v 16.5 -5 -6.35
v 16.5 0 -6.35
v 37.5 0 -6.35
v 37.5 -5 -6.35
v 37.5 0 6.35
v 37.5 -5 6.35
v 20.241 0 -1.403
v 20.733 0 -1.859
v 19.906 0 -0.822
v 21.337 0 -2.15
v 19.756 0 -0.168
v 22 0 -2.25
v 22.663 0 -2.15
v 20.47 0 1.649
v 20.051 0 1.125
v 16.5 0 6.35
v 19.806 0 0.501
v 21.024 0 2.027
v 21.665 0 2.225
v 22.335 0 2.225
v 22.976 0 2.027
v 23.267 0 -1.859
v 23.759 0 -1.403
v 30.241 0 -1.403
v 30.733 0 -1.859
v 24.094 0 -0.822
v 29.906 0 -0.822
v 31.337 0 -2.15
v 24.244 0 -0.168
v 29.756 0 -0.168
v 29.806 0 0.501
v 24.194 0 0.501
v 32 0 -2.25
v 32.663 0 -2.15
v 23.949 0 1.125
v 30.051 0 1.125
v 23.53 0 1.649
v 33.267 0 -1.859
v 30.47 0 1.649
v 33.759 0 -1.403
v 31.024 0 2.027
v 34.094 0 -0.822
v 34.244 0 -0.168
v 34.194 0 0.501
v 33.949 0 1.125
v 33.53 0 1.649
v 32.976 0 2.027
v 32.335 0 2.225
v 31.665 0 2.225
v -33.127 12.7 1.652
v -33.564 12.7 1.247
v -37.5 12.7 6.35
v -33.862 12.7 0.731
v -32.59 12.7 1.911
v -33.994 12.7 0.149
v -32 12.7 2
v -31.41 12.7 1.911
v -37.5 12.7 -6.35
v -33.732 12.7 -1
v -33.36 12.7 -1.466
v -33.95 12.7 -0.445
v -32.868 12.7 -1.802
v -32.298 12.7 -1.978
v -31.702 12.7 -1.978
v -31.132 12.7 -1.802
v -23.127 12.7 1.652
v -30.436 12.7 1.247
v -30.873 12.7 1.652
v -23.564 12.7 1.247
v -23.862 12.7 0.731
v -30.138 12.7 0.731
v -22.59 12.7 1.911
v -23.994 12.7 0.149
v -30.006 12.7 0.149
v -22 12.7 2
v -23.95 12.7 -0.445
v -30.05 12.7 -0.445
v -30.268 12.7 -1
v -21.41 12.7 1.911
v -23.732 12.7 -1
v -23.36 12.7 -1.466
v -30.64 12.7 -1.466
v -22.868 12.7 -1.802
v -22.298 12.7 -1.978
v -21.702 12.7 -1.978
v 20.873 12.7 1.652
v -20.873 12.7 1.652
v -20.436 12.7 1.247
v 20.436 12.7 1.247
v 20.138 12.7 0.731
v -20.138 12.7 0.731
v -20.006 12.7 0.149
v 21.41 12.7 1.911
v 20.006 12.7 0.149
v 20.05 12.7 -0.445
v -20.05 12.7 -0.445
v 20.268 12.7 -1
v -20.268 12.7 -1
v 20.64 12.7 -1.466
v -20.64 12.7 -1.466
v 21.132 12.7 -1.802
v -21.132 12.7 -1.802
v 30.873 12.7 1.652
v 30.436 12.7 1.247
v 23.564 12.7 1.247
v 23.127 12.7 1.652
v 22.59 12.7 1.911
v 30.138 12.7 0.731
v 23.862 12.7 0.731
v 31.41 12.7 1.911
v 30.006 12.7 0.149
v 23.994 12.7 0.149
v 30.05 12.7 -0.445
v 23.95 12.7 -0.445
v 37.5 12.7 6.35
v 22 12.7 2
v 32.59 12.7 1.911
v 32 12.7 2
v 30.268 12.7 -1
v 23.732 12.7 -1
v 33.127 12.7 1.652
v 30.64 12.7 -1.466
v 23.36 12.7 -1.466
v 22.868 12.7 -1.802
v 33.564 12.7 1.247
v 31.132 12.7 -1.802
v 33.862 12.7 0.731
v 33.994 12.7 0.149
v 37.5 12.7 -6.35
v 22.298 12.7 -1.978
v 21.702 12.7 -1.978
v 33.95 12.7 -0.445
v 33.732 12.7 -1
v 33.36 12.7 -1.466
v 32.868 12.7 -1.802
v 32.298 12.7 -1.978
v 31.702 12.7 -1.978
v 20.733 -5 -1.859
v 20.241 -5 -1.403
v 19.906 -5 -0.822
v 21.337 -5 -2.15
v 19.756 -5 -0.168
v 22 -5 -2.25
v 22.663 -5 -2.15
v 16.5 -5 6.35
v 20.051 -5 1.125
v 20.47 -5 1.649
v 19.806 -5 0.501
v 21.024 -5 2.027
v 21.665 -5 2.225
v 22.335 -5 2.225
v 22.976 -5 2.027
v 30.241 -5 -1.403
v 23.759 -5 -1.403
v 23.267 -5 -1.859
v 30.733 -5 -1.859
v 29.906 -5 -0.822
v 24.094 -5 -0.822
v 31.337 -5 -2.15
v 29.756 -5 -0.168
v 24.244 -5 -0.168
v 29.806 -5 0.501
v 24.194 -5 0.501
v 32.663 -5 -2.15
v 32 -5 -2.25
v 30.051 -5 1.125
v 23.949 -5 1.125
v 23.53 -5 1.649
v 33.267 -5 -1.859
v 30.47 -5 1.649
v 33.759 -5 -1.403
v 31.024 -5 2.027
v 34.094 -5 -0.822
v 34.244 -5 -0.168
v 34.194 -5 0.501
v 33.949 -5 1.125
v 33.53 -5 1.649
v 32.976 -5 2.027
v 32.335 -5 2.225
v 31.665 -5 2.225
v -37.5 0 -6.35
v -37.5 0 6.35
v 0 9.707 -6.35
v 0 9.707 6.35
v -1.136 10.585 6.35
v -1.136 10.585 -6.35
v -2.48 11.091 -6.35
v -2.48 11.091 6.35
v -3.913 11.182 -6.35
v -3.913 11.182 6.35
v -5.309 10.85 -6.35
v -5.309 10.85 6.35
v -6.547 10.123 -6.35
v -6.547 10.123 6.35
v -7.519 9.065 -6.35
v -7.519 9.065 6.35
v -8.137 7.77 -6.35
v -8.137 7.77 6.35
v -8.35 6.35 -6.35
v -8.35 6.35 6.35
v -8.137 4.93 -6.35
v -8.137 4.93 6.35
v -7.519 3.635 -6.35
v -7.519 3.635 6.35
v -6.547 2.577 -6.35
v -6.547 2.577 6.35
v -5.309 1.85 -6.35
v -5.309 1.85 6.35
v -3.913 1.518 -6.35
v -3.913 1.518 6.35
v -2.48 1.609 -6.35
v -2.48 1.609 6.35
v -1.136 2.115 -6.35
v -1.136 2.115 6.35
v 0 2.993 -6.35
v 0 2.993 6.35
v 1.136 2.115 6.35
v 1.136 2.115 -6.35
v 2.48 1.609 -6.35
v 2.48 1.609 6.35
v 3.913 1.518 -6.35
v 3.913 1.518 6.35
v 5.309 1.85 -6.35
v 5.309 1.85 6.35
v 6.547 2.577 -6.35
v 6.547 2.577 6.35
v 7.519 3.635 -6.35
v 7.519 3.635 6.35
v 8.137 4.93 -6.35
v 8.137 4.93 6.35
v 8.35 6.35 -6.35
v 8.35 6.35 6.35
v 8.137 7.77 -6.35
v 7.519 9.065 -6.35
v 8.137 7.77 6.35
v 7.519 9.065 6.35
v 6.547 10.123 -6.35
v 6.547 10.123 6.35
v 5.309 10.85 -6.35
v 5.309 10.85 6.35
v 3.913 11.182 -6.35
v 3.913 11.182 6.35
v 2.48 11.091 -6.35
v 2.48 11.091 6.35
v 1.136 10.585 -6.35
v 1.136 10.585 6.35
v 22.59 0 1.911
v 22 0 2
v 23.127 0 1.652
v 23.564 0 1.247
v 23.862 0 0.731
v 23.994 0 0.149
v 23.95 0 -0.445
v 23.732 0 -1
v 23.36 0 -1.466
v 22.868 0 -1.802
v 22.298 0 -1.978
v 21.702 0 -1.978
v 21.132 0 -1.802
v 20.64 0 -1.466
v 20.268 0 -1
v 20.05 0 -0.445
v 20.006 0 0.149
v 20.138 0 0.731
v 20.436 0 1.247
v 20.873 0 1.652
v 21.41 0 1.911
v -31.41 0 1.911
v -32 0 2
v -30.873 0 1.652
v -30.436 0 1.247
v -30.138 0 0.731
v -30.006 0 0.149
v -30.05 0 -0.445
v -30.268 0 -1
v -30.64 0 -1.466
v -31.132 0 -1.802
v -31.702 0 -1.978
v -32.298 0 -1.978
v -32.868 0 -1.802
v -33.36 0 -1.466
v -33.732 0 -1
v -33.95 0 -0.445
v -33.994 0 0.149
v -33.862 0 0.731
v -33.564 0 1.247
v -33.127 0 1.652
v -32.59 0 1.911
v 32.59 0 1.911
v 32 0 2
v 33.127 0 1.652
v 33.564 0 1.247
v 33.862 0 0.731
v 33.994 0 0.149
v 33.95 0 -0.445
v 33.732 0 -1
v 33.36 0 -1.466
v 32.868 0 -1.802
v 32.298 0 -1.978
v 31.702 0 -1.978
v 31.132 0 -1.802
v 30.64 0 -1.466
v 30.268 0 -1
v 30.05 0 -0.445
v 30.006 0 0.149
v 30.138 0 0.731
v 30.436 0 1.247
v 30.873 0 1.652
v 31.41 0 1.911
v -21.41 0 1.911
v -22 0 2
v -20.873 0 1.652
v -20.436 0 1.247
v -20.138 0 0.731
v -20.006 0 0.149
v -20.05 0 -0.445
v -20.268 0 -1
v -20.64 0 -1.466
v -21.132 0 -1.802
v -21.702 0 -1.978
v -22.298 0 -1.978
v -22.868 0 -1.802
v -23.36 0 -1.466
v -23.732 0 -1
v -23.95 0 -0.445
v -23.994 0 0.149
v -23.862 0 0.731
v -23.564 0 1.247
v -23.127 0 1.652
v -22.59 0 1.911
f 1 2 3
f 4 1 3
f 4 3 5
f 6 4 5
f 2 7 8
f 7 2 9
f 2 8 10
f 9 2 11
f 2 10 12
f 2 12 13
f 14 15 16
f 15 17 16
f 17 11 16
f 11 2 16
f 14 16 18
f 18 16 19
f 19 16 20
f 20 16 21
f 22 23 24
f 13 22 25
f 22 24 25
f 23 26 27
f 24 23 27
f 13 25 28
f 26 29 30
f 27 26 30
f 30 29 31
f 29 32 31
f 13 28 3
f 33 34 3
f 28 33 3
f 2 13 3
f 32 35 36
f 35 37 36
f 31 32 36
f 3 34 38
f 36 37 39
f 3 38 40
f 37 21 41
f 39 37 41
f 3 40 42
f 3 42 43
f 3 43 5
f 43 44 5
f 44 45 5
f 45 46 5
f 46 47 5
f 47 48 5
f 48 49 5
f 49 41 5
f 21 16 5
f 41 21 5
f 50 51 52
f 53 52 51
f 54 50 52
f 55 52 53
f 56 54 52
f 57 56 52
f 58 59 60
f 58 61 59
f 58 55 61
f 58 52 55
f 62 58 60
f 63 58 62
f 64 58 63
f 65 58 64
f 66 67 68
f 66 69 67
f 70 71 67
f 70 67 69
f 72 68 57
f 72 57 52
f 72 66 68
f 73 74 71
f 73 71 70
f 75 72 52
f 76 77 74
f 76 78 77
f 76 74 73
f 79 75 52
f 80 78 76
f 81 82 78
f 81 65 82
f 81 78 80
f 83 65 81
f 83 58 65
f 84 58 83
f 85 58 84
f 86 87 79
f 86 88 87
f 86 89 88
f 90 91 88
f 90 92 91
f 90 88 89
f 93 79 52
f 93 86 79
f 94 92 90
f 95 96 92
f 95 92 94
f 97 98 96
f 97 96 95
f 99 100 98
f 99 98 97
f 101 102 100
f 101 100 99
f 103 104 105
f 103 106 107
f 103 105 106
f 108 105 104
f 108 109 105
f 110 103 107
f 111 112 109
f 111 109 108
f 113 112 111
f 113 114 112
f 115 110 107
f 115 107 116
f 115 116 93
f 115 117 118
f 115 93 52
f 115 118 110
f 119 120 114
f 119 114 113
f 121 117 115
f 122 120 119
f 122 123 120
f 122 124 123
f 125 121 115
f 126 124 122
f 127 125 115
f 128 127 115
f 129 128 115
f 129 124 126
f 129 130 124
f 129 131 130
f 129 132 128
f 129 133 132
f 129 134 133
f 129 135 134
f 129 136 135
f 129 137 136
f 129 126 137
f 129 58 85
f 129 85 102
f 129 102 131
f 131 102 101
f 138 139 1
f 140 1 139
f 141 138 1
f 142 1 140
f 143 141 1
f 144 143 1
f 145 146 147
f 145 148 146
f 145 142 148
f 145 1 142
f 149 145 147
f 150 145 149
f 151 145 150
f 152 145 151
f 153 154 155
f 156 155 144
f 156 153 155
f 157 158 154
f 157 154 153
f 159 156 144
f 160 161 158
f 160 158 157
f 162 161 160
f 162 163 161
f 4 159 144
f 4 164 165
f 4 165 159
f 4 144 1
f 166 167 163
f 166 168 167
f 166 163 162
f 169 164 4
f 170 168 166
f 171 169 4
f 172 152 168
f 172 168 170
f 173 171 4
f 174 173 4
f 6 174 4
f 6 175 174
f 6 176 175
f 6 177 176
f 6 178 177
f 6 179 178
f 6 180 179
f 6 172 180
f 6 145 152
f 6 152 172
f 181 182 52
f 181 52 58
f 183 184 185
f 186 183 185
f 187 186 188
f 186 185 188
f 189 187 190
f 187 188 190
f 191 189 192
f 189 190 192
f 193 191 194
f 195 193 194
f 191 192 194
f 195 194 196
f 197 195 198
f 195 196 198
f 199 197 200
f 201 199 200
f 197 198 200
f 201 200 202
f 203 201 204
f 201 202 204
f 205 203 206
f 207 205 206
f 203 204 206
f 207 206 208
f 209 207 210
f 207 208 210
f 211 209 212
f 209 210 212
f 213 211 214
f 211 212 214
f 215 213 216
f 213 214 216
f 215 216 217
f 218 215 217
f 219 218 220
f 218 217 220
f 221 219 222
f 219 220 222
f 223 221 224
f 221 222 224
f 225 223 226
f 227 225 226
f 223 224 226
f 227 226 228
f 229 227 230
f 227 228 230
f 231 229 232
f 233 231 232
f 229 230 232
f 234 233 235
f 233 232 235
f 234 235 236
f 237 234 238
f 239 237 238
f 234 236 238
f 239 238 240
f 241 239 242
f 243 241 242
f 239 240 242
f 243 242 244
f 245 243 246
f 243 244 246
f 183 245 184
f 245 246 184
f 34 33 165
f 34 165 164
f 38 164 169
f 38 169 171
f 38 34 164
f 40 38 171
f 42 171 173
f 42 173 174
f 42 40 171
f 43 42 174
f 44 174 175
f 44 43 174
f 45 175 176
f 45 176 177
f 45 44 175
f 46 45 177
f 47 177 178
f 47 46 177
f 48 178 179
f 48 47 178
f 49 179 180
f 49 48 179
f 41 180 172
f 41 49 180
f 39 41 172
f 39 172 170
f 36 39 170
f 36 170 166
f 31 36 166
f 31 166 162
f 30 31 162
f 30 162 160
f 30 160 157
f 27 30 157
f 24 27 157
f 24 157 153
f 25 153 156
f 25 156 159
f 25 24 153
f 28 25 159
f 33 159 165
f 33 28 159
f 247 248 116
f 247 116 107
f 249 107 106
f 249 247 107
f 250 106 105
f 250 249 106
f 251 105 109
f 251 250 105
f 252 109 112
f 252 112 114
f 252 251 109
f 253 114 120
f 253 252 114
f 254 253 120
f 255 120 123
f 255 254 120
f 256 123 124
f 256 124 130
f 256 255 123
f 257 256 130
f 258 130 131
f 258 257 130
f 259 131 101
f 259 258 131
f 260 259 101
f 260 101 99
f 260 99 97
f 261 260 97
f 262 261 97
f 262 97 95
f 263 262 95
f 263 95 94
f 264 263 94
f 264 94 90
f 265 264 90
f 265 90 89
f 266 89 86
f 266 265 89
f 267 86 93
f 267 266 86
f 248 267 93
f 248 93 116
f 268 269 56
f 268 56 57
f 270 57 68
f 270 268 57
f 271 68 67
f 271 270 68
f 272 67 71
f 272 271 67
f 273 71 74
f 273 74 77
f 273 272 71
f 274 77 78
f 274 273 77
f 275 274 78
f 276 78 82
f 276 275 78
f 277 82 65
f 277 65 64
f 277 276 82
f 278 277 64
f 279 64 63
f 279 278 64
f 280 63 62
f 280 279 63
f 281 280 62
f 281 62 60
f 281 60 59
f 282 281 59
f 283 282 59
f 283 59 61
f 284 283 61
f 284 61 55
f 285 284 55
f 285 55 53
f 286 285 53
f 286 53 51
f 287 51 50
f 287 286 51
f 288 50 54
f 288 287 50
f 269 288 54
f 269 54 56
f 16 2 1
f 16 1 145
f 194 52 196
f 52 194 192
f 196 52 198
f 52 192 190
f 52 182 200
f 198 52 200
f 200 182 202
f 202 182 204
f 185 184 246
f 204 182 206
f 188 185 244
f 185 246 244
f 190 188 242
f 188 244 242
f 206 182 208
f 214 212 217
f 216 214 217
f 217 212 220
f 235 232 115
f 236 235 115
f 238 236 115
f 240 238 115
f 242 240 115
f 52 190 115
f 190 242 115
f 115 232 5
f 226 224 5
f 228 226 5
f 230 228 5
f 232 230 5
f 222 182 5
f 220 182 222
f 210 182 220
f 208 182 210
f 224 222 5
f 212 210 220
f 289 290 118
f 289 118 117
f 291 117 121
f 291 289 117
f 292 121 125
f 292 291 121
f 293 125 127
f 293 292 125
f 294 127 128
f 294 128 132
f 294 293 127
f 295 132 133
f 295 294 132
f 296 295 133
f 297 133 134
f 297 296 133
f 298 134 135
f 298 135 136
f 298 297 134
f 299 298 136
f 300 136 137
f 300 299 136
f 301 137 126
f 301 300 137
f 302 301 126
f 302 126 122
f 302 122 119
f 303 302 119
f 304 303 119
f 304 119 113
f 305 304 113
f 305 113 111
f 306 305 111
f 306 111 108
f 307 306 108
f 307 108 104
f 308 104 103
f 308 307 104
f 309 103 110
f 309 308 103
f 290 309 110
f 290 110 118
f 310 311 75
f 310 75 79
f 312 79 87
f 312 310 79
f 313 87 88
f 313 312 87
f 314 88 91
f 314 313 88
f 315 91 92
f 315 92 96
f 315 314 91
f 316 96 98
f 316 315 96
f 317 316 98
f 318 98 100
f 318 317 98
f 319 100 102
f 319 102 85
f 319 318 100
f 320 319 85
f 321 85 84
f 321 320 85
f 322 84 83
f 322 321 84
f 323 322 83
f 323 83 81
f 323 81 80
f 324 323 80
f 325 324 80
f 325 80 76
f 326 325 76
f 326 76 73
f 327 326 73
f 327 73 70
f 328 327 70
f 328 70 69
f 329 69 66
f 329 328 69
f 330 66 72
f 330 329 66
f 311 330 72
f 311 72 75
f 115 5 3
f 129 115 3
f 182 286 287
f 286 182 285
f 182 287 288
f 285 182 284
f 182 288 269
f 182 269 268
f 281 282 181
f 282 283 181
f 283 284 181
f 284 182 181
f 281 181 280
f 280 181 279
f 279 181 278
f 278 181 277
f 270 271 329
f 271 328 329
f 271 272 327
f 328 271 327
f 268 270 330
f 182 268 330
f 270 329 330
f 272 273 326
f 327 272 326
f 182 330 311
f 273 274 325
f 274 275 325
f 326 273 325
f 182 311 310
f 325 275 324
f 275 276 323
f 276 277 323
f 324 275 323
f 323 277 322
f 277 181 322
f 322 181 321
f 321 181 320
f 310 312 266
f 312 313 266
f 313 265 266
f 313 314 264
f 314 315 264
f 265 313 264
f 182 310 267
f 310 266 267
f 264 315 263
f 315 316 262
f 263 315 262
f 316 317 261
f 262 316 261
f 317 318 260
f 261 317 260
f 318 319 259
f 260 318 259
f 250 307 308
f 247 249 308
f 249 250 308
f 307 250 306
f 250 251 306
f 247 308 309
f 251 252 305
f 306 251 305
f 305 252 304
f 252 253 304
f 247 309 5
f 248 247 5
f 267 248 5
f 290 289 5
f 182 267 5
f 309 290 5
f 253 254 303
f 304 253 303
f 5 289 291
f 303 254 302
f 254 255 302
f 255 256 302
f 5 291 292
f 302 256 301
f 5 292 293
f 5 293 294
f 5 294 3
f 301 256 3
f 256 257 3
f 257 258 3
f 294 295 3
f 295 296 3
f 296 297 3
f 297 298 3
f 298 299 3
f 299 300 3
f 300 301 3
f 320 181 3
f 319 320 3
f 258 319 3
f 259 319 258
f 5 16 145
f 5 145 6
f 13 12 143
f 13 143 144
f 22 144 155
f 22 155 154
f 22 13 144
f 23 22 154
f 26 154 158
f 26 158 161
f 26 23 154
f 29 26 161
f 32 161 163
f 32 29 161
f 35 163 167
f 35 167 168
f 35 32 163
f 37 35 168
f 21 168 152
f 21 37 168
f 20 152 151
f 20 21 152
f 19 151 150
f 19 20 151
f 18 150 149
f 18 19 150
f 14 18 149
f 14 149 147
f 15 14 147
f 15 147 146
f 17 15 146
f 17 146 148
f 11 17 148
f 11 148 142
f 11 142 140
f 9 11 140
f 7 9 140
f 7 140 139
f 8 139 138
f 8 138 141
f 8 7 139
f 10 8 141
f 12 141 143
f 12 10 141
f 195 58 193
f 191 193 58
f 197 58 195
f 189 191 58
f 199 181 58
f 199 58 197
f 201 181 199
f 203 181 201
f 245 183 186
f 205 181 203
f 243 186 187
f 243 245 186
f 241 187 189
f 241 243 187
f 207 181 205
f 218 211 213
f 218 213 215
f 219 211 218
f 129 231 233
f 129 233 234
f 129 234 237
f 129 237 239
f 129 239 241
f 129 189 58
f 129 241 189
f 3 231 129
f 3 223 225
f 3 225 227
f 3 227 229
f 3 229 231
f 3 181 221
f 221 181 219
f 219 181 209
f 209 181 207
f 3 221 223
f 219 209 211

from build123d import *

# Parameters (mm, degrees)
SKETCH1_W           = 75
SKETCH1_H           = 12.7
SKETCH1_R           = 2
BOSS_EXTRUDE1_DEPTH = 12.7
SKETCH2_R           = 4.85
CUT_EXTRUDE1_DEPTH  = 12.7
SKETCH3_W           = 21
SKETCH3_H           = 12.7
SKETCH3_R           = 2.25
BOSS_EXTRUDE2_DEPTH = 5


with BuildPart() as part:
    # Sketch1 → Boss-Extrude1 (new body)
    with BuildSketch(Plane(origin=(0, 0, 0), x_dir=(1, 0, 0), z_dir=(0, 1, 0))):
        Rectangle(SKETCH1_W, SKETCH1_H)
        with Locations(Location((-32, 0, 0), (0, 0, 270))):
            Circle(SKETCH1_R, mode=Mode.SUBTRACT)
        with Locations(Location((-22, 0, 0), (0, 0, 270))):
            Circle(SKETCH1_R, mode=Mode.SUBTRACT)
        with Locations(Location((22, 0, 0), (0, 0, 270))):
            Circle(SKETCH1_R, mode=Mode.SUBTRACT)
        with Locations(Location((32, 0, 0), (0, 0, 270))):
            Circle(SKETCH1_R, mode=Mode.SUBTRACT)
    extrude(amount=BOSS_EXTRUDE1_DEPTH)

    # Sketch2 → Cut-Extrude1 (cut)
    with BuildSketch(Plane.XY.offset(6.35)):
        with Locations((3.5, 6.35)):
            Circle(SKETCH2_R)
        with Locations((-3.5, 6.35)):
            Circle(SKETCH2_R)
    extrude(amount=-CUT_EXTRUDE1_DEPTH, mode=Mode.SUBTRACT)


with BuildPart() as body_2:
    # Sketch3 → Boss-Extrude2 (new body)
    with BuildSketch(Plane.XZ):
        with Locations((27, 0)):
            Rectangle(SKETCH3_W, SKETCH3_H)
        with Locations(Location((32, 0, 0), (0, 0, 270))):
            Circle(SKETCH3_R, mode=Mode.SUBTRACT)
        with Locations(Location((22, 0, 0), (0, 0, 270))):
            Circle(SKETCH3_R, mode=Mode.SUBTRACT)
    extrude(amount=BOSS_EXTRUDE2_DEPTH)


solid = Compound([part.part, body_2.part])
